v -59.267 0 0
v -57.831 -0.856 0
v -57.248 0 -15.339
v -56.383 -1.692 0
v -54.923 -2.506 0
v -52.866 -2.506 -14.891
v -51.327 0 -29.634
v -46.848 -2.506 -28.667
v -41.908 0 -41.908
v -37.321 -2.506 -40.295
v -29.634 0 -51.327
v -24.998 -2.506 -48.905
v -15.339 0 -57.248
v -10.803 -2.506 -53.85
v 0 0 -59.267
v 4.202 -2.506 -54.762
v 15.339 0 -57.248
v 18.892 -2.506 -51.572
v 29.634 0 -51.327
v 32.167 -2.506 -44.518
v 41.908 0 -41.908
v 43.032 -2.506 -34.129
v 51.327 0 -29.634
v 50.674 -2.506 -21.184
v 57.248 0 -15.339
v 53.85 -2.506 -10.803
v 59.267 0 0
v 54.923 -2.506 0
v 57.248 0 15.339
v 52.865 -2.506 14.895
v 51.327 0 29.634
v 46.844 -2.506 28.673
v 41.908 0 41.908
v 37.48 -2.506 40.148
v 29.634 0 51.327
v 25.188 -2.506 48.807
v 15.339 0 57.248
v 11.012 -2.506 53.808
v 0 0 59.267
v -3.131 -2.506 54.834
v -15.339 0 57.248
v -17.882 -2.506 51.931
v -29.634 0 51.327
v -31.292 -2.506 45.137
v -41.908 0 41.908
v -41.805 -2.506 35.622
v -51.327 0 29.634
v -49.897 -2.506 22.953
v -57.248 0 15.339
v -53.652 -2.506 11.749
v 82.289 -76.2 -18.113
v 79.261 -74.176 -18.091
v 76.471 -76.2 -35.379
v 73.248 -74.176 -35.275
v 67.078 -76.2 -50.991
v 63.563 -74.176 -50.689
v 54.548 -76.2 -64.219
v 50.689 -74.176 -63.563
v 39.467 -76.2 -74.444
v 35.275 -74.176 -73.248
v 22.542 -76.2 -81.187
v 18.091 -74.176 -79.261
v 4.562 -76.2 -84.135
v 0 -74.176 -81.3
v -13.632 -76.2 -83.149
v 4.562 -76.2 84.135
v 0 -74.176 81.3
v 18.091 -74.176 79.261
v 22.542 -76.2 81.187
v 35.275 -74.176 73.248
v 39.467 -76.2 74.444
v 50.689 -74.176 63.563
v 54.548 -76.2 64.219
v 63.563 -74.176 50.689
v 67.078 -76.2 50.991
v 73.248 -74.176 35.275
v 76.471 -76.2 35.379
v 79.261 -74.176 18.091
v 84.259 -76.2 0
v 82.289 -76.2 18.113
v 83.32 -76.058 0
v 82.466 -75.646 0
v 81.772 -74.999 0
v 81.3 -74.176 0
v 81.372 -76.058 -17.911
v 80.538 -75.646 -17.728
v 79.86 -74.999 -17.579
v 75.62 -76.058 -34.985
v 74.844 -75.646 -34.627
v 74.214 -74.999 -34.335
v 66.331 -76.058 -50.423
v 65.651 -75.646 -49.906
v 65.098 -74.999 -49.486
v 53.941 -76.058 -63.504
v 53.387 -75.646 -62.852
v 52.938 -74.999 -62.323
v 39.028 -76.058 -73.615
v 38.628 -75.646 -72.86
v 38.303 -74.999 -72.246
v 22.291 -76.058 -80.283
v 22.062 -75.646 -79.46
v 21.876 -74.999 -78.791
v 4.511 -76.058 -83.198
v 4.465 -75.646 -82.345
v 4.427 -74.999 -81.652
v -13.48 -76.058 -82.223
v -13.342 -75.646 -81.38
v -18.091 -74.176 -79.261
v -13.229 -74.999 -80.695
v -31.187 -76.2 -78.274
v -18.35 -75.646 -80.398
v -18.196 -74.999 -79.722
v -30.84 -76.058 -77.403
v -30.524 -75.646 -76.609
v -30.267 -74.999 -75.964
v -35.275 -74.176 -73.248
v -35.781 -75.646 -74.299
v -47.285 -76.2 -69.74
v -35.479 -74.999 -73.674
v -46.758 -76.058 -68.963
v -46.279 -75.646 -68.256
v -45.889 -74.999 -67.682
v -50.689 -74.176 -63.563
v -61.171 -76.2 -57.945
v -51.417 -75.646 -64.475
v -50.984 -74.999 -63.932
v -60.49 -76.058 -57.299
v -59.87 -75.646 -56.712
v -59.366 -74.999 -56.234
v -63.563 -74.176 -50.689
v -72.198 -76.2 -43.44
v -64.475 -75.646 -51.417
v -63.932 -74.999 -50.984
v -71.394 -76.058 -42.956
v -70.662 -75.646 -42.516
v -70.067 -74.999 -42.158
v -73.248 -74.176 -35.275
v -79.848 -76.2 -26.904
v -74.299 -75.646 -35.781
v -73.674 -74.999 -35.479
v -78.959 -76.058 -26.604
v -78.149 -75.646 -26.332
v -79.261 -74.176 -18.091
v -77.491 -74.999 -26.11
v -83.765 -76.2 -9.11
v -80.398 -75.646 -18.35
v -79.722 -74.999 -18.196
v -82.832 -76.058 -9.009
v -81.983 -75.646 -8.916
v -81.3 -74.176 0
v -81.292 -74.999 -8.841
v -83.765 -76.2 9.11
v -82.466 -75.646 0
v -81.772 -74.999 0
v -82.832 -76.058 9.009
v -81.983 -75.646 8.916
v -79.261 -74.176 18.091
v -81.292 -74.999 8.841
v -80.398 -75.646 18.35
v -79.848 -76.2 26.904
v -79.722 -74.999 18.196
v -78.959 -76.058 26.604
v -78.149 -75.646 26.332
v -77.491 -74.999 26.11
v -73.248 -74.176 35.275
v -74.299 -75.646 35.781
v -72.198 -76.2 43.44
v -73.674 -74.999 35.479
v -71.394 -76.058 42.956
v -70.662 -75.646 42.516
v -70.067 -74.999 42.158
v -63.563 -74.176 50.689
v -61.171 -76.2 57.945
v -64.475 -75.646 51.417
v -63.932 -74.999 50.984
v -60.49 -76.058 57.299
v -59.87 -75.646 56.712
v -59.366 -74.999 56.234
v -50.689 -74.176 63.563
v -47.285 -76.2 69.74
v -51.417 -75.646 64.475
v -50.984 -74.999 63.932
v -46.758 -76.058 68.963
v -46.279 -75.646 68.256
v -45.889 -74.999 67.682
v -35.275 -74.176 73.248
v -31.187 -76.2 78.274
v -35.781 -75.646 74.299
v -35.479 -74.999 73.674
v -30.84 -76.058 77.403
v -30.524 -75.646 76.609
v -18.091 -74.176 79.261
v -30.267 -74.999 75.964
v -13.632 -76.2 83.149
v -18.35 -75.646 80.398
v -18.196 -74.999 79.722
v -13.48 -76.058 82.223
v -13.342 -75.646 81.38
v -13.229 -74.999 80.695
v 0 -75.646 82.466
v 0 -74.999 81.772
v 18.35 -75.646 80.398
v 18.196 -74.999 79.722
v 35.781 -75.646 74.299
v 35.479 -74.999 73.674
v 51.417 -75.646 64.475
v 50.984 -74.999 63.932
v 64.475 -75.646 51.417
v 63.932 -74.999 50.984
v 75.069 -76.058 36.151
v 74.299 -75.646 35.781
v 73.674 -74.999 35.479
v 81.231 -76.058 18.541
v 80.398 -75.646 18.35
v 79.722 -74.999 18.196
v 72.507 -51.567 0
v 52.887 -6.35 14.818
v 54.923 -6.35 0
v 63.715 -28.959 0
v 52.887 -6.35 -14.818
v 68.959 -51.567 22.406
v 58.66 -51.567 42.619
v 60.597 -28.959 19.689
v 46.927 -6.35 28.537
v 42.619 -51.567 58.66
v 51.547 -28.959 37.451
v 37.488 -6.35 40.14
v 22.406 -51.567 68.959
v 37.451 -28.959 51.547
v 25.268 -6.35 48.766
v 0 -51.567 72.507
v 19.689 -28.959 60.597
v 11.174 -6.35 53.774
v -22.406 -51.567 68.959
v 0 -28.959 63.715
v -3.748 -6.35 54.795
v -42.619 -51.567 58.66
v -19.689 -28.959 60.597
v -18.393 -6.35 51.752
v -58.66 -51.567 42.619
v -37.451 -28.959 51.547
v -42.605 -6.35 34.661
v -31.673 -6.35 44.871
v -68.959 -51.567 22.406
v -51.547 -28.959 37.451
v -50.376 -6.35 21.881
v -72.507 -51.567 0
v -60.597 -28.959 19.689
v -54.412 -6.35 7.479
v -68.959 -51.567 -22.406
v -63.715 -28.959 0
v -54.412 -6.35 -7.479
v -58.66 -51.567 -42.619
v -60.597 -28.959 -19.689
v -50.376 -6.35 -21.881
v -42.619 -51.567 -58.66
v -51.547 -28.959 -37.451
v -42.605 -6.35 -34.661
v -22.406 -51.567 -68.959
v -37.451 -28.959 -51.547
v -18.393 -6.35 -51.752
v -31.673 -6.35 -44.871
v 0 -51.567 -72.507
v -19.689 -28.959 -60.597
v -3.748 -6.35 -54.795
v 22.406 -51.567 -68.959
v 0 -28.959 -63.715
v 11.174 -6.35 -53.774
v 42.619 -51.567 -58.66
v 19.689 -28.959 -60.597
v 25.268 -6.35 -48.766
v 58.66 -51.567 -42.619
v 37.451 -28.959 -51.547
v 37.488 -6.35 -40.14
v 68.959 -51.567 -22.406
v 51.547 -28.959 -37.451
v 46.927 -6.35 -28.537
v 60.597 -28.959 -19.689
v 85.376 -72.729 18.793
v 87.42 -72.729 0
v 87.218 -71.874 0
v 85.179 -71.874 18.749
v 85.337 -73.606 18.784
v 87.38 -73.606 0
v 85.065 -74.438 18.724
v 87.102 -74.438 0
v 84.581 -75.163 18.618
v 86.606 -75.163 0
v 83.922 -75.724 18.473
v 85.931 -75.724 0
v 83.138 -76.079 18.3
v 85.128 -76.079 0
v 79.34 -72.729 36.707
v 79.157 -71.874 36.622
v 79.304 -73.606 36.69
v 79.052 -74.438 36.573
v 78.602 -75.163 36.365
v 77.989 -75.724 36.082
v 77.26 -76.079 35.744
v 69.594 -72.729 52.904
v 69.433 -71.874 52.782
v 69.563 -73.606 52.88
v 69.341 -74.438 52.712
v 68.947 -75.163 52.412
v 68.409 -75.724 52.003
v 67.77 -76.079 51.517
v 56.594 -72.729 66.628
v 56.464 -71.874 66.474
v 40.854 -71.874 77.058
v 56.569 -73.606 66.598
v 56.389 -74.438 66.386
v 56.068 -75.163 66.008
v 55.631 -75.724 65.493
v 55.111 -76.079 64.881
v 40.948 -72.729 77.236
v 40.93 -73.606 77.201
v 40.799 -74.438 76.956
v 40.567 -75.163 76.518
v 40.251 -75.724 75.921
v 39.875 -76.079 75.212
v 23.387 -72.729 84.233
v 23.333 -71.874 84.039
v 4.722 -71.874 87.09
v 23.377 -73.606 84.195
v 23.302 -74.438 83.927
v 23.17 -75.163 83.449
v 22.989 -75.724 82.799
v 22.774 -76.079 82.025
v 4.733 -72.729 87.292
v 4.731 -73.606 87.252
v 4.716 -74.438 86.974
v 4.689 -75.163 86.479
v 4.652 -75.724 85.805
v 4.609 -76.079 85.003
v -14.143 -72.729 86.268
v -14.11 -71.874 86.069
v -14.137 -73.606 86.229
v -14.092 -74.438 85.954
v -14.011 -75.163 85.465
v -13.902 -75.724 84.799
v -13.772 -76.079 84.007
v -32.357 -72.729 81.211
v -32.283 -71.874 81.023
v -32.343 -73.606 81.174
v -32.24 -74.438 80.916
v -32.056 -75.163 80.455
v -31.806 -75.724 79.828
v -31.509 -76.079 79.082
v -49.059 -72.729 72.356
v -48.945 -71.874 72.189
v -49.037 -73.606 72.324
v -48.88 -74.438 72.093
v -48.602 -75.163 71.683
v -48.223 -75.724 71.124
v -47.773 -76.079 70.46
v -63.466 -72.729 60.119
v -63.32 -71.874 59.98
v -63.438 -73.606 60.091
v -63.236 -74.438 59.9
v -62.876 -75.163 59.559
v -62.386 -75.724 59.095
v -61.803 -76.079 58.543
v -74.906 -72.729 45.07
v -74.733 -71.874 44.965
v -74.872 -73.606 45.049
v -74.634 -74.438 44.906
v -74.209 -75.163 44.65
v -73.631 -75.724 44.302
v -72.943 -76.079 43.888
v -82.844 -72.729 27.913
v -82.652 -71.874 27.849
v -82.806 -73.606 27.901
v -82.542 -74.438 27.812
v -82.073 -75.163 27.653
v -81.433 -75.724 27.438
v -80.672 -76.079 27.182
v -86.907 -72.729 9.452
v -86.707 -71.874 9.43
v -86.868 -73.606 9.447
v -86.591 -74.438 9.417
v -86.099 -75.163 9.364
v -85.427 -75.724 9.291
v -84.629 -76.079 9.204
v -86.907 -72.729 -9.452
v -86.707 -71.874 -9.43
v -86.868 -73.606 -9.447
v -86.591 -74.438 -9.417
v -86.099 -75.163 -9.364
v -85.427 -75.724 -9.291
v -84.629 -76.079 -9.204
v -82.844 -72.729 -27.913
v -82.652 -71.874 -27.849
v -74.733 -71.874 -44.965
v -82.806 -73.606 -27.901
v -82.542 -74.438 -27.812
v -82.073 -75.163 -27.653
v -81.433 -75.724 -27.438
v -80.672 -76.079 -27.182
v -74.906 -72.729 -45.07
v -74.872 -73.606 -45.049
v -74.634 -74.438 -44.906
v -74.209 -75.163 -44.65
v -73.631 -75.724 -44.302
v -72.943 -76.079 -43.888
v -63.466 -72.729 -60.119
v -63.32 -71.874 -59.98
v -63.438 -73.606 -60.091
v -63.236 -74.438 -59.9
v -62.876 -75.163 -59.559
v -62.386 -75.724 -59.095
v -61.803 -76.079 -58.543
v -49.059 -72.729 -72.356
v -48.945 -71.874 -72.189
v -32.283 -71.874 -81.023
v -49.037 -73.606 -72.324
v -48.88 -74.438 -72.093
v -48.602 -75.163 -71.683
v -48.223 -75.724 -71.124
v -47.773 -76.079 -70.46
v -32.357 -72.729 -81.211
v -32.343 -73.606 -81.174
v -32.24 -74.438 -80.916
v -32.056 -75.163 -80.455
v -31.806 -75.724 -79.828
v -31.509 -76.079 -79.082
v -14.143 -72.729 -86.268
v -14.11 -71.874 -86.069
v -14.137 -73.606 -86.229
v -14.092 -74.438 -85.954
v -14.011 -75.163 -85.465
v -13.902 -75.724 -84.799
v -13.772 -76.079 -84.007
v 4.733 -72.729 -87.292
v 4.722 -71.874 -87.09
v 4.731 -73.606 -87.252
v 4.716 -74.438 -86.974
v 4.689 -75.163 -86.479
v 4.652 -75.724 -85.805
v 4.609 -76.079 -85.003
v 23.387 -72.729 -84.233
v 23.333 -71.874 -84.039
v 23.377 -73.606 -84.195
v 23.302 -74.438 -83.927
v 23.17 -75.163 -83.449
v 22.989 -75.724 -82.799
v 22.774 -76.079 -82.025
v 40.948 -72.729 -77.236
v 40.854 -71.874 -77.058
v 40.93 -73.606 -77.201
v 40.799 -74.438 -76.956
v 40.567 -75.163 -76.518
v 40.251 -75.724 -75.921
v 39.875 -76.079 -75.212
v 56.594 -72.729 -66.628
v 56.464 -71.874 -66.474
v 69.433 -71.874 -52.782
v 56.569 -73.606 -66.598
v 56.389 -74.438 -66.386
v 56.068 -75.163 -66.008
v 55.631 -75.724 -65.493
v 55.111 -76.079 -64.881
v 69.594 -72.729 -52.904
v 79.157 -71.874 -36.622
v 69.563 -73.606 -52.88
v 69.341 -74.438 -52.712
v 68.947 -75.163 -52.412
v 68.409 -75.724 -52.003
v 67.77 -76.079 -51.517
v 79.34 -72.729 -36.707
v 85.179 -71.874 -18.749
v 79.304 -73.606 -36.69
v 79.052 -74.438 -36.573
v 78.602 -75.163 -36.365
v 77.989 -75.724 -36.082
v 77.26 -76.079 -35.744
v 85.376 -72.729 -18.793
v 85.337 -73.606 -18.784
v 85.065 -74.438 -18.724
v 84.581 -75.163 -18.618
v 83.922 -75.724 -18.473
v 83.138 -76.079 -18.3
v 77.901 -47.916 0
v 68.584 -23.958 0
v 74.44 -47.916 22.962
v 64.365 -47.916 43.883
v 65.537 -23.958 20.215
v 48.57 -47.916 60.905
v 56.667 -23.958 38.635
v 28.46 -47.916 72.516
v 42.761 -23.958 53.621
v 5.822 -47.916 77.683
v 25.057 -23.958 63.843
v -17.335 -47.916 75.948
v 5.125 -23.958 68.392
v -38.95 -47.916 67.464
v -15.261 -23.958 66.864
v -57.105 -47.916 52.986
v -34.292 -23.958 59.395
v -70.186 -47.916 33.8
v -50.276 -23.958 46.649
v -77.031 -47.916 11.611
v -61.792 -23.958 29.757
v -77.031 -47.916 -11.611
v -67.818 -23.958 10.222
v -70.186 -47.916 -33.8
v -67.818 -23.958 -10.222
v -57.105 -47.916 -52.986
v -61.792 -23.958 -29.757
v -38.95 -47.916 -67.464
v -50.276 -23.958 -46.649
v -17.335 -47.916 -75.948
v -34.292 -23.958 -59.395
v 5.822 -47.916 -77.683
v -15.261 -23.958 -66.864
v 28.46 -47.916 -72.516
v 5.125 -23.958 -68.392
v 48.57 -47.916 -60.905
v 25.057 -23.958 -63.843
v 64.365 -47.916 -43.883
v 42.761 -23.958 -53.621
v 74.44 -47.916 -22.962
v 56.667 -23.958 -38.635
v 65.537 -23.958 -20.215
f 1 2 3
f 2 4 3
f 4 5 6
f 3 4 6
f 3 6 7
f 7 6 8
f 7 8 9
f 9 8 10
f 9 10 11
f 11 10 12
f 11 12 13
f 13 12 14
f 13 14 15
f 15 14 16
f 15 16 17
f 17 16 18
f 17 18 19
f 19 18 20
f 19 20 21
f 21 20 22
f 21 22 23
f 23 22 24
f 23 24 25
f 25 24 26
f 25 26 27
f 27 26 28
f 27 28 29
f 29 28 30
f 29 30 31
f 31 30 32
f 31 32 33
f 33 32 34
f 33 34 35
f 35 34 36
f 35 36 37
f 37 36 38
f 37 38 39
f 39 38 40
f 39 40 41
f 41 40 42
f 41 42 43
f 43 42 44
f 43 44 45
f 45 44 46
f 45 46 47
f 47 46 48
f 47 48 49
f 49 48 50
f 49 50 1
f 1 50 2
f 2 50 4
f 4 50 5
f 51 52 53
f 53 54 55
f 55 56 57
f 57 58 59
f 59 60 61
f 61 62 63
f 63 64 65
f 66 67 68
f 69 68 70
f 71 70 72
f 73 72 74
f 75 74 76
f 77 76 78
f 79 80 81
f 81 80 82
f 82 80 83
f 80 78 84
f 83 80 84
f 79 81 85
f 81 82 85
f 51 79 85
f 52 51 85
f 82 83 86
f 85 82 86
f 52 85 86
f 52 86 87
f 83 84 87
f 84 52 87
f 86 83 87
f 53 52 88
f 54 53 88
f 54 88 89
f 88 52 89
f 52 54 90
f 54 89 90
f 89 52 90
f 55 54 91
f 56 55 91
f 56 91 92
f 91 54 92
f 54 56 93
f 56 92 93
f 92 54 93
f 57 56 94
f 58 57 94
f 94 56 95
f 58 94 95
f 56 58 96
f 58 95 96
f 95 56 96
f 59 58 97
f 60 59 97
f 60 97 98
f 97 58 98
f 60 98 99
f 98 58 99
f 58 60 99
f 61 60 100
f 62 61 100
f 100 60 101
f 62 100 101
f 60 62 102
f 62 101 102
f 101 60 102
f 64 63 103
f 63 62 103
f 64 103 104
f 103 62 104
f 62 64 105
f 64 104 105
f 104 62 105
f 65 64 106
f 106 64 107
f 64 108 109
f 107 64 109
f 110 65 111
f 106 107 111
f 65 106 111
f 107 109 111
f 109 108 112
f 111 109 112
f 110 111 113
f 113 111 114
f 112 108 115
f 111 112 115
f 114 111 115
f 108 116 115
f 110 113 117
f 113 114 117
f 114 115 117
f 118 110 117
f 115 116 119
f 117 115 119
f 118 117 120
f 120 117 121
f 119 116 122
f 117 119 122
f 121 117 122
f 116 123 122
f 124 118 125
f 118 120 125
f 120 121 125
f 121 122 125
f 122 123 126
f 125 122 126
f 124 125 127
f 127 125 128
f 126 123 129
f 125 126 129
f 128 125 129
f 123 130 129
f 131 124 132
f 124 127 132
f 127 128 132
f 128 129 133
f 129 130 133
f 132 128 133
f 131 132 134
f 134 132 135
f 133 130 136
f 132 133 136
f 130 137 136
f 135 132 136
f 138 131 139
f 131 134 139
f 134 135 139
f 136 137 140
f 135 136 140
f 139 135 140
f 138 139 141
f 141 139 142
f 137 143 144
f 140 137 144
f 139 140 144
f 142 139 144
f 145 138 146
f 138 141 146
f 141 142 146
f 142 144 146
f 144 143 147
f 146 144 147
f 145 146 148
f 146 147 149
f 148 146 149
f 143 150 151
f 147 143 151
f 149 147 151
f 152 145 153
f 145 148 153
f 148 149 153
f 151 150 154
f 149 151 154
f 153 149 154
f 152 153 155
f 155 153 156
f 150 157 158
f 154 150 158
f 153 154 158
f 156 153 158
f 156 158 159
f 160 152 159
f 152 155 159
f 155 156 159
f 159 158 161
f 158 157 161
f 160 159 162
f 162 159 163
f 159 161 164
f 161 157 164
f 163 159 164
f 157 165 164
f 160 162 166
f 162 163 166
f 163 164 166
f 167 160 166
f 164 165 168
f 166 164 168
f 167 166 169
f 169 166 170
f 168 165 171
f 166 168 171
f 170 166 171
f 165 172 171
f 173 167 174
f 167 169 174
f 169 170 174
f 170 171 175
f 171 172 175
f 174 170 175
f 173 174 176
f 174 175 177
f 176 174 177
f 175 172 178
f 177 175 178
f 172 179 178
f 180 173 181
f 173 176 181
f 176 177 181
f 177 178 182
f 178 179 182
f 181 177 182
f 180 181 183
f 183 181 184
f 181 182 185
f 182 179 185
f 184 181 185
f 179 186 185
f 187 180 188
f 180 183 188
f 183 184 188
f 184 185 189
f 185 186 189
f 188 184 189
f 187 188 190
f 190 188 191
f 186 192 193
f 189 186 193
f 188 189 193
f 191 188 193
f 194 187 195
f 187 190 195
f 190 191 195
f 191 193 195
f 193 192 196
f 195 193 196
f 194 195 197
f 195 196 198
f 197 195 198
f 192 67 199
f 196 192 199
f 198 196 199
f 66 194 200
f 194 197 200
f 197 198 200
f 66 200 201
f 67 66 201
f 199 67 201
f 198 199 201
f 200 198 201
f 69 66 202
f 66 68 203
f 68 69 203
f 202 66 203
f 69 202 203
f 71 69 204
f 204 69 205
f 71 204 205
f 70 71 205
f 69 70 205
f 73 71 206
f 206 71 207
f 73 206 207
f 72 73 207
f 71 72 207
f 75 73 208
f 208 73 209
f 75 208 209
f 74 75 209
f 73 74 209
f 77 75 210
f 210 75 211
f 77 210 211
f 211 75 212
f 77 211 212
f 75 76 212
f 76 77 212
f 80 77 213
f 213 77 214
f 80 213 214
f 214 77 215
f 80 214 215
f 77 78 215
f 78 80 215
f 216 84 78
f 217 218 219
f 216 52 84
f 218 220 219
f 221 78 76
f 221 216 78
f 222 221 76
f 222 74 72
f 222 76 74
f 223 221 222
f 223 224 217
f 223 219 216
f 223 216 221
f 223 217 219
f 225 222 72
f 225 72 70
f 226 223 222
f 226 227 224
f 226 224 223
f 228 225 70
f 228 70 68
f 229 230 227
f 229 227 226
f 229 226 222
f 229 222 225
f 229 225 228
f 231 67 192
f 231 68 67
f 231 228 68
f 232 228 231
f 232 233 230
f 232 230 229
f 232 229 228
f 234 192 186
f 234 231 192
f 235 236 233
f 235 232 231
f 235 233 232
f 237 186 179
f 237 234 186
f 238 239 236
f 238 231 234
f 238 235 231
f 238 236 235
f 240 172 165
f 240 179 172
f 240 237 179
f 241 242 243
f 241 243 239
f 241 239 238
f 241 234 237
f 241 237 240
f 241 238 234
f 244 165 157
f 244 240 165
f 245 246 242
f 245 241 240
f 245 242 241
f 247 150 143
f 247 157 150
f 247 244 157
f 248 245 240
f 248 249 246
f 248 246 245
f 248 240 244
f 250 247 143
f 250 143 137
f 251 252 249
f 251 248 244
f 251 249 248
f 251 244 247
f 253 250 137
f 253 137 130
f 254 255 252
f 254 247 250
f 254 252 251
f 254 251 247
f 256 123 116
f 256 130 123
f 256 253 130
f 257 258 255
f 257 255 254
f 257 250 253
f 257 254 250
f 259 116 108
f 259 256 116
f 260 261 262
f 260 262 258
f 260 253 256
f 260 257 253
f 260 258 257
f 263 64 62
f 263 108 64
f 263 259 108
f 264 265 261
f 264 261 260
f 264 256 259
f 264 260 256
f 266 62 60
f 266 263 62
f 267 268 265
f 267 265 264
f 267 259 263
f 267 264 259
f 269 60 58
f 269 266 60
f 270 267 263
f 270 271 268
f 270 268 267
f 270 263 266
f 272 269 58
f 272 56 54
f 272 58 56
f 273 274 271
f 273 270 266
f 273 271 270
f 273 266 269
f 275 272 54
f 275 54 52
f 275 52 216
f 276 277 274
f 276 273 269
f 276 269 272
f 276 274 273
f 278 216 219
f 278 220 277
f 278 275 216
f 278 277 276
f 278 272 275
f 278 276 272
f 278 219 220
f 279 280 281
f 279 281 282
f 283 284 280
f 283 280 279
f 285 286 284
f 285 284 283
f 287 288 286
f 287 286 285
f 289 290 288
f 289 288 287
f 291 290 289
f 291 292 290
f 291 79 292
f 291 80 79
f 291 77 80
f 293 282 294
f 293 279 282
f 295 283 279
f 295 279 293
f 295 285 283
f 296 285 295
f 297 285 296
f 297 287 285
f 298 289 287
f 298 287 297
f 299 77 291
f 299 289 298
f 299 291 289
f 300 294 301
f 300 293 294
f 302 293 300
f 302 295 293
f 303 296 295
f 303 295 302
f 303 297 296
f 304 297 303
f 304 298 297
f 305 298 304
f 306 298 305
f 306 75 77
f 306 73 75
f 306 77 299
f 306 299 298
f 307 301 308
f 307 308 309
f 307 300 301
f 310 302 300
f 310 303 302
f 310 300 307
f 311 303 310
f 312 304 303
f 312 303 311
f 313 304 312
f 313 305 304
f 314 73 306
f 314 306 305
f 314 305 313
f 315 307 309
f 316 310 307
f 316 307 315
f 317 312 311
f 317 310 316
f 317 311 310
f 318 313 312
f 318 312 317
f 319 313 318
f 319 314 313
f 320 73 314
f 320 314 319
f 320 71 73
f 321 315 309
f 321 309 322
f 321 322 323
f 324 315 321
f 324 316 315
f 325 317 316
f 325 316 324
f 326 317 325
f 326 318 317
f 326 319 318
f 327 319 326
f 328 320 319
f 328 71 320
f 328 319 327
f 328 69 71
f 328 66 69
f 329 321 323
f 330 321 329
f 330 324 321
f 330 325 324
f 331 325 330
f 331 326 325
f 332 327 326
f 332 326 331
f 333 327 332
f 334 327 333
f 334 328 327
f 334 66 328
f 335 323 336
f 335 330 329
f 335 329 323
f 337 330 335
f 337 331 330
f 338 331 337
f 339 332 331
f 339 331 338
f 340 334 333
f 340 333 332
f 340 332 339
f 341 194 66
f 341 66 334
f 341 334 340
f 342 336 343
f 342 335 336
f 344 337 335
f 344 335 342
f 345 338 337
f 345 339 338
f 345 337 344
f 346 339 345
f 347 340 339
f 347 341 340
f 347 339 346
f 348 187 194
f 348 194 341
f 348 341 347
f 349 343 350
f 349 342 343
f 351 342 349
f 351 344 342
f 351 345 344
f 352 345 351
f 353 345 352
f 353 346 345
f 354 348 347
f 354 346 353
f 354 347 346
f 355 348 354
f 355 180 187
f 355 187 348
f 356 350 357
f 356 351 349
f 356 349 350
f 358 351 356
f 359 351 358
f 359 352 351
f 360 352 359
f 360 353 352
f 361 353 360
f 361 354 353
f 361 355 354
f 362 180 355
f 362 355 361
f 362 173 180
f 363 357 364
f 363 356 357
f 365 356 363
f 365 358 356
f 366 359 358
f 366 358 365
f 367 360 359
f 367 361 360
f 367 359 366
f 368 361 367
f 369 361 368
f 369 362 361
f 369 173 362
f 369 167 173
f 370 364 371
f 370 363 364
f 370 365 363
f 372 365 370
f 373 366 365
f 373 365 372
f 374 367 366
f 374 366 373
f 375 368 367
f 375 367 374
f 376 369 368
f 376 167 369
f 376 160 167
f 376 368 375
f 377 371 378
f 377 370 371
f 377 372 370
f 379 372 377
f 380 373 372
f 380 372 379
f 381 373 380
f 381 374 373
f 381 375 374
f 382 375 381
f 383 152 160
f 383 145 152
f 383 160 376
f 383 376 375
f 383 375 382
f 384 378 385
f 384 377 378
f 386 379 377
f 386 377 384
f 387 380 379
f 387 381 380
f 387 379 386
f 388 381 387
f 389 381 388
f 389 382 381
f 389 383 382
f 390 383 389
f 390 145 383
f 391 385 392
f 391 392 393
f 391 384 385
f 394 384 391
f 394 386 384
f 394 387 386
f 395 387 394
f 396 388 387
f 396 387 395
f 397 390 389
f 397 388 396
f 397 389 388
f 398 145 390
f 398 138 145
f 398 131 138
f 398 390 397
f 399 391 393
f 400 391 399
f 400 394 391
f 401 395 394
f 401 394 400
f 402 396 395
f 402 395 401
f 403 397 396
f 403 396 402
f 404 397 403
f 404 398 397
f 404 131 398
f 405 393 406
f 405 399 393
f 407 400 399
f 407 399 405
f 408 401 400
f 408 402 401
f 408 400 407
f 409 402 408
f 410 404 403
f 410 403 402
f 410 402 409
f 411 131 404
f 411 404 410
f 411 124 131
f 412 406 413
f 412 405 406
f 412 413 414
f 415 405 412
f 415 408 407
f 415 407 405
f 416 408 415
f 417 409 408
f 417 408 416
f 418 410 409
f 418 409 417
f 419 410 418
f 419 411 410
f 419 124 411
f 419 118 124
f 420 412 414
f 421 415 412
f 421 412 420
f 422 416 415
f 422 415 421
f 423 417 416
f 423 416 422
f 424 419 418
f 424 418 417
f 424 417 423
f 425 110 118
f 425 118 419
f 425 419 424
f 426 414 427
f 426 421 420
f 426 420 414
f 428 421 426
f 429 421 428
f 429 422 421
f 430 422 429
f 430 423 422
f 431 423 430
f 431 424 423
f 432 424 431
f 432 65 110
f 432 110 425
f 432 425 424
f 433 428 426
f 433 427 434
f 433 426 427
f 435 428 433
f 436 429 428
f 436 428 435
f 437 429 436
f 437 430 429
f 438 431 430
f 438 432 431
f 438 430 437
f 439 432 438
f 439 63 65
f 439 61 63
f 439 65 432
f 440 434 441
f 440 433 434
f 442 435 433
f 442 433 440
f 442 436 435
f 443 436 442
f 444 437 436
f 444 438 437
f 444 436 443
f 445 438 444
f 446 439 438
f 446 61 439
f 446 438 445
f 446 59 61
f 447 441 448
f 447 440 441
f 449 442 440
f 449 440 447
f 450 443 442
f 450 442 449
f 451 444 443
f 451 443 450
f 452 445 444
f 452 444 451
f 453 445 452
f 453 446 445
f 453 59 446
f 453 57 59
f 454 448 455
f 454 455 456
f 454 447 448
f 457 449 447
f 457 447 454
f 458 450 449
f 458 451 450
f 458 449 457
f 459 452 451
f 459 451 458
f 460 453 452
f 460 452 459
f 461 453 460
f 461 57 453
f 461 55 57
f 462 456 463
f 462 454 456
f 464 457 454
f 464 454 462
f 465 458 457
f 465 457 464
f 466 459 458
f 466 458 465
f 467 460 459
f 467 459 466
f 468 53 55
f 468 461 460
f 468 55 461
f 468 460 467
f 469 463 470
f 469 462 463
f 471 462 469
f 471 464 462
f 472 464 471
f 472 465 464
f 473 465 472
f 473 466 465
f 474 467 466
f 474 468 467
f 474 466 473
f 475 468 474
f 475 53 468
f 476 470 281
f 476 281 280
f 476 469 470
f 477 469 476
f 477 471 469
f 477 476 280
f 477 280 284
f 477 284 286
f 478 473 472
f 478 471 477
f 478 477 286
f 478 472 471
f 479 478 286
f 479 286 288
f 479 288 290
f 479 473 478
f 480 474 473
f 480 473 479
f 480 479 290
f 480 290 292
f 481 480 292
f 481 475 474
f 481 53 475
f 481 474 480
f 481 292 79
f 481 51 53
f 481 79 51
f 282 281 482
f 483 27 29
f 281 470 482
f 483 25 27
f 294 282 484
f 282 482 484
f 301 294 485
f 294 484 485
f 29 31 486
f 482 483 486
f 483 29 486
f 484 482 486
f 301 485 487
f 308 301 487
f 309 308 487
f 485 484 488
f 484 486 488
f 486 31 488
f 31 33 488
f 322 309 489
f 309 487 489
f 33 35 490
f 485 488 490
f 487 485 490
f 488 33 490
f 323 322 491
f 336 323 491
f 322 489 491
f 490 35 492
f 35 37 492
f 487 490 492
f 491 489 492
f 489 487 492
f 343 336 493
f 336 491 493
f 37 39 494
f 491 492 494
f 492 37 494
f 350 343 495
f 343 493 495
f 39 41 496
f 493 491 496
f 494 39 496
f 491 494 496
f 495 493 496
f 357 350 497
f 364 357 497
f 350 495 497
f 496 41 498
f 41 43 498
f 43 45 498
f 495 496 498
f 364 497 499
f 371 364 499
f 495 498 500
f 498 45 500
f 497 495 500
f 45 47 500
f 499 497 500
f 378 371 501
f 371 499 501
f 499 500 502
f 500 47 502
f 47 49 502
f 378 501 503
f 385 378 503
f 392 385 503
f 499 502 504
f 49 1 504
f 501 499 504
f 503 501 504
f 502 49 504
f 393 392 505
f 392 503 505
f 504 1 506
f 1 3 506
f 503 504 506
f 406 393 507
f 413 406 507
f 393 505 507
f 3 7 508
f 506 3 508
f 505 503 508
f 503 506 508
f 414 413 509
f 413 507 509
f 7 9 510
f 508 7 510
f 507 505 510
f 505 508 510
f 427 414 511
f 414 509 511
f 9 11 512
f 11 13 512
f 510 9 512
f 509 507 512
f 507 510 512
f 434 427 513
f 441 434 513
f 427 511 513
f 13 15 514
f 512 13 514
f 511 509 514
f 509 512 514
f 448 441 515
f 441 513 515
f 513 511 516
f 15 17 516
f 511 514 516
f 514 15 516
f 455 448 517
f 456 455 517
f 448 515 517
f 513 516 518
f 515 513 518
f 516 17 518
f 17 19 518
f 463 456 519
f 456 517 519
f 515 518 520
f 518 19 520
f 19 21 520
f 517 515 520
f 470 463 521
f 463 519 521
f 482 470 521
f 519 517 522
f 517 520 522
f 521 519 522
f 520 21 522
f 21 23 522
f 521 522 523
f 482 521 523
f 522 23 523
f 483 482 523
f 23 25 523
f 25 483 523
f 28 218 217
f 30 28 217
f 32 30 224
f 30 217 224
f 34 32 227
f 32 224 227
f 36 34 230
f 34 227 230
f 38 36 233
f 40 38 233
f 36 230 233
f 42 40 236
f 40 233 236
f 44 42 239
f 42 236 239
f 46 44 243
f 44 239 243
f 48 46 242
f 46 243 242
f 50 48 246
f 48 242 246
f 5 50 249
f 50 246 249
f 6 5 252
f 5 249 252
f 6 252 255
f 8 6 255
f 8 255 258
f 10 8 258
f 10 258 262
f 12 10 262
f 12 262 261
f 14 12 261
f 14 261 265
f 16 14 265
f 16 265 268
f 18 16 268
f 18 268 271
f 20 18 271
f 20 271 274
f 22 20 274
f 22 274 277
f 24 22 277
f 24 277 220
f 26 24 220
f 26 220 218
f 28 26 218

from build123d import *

# Parameters (mm, degrees)
F2_R     = 88.9
F0_R     = 59.26709
F4_T     = -6.35
F5_R     = 54.9232413826
F6_DEPTH = 6.3510001
F7_R     = 3.17499


# Not quite as in the source:
# - a fillet or chamfer is up to 0.001 mm smaller than in the source, because OpenCascade refuses the exact size


with BuildPart() as f3:
    # F2 (on offset) → F3 section 0
    with BuildSketch(Plane.XZ.offset(76.2)):
        Circle(F2_R)
    # F0 (on Front) → F3 section 1
    with BuildSketch(Plane.XZ):
        Circle(F0_R)
    loft()

    # F4
    f4_openings = [f3.faces().sort_by_distance(p)[0] for p in [
        (0, -76.2, 0),
    ]]
    offset(amount=F4_T, openings=f4_openings, kind=Kind.INTERSECTION)

    # F5 (on face) → F6 (cut, through all)
    with BuildSketch(Plane.XZ.offset(6.35)):
        Circle(F5_R)
    extrude(amount=-F6_DEPTH, mode=Mode.SUBTRACT)

    # F7 (radius 3.175 in the source; OpenCascade refuses exactly that, so slightly less here)
    f7_edges = [f3.edges().sort_by_distance(p)[0] for p in [
        (-88.9, -76.2, 0),
        (-82.086742, -76.2, 0),
    ]]
    fillet(f7_edges, radius=F7_R)

    # F8 (on Top) → F9 (revolve, cut)
    with BuildSketch(Plane.XY):
        with BuildLine():
            Line((0, 0), (-59.26709, 0))
            ThreePointArc((-59.26709, 0), (-30.7694079322, -12.346744825), (0, -16.5661673578))
            Line((0, -16.5661673578), (0, 0))
        make_face()
    revolve(axis=Axis((0, -8.2830836789, 0), (0, -1, 0)), mode=Mode.SUBTRACT)


solid = f3.part
